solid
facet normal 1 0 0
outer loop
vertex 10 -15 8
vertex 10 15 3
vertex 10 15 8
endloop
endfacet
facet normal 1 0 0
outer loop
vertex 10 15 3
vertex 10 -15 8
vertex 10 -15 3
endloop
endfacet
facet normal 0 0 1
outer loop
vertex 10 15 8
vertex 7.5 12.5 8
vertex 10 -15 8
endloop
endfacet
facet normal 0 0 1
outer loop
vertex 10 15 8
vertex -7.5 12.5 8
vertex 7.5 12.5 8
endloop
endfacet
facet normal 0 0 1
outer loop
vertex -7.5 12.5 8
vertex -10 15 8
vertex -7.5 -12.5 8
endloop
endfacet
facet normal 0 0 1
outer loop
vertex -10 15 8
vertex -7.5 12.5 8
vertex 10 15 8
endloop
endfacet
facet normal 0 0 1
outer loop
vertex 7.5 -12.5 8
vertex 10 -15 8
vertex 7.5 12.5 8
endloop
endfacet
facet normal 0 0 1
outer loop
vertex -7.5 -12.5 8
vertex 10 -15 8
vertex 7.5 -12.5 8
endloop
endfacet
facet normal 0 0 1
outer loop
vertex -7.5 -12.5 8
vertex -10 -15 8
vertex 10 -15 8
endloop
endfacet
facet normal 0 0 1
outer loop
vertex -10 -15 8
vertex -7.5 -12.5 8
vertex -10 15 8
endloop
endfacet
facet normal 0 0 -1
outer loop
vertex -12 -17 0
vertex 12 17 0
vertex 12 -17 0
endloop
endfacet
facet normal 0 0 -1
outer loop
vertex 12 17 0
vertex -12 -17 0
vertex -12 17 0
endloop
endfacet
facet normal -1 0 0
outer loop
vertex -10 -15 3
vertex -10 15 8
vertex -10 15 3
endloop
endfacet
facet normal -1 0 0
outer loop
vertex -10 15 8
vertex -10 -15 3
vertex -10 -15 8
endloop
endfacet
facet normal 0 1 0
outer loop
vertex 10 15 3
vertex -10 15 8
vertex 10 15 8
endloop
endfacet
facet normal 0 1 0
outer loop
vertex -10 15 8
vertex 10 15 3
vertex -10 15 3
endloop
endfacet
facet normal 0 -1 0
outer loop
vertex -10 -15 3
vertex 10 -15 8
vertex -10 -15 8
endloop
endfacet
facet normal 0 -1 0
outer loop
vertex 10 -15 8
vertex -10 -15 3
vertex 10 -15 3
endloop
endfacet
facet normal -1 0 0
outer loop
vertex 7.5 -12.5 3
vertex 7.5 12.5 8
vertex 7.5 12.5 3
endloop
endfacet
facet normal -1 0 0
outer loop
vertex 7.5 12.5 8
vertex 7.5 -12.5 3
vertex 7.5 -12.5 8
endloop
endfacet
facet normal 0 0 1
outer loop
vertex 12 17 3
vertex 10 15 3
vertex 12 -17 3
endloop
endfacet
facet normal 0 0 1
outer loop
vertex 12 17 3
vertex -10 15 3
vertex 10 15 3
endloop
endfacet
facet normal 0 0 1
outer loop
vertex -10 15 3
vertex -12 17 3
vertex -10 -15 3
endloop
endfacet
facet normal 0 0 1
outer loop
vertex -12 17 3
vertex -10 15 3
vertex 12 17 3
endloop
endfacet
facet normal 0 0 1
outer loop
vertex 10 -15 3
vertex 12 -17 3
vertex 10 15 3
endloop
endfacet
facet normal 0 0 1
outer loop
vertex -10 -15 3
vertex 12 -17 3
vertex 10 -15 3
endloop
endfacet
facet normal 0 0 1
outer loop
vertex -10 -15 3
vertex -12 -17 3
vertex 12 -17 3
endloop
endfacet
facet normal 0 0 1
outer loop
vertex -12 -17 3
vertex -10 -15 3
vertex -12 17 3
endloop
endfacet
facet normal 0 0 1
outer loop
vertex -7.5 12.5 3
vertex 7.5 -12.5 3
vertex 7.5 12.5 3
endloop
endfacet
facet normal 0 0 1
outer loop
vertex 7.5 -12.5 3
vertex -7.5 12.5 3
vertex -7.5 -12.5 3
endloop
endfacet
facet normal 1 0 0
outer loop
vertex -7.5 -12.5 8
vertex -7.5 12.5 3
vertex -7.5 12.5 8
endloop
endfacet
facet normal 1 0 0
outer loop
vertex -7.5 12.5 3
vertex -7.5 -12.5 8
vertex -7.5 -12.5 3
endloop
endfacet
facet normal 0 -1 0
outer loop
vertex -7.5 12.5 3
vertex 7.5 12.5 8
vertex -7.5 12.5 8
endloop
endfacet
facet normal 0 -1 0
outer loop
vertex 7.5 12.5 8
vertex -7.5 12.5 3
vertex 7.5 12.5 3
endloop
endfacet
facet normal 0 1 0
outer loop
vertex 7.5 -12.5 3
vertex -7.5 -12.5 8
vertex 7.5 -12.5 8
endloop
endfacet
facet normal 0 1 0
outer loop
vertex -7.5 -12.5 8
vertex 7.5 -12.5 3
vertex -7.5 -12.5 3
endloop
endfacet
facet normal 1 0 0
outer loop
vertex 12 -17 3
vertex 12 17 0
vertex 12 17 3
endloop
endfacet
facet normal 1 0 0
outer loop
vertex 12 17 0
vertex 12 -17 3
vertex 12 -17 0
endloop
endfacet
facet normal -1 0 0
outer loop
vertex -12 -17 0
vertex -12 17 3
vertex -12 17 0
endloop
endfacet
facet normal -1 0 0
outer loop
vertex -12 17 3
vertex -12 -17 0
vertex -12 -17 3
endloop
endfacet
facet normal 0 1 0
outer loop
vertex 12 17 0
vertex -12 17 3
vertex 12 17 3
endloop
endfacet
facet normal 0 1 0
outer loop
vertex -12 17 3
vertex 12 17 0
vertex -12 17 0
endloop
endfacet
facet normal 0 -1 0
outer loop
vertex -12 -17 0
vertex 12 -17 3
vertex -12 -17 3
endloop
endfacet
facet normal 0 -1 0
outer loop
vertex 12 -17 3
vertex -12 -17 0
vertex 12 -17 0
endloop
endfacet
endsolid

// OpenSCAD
// Customizable square device foot
// Created by Kjell Kernen
// Date 14.1.2017

/*[Foot Parameters]*/

// of the foot in mm:
length=20;         // [5:100]

// of the foot in mm:
width=30;          // [5:100]

// of the foot in mm:
total_heigth=8;   // [5:50]

// of the foot in mm:
flange_heigth=3;   // [0:5]

// of the foot in mm:
flange_width=2;    // [0:5]

/*[Hidden]*/
base_heigth=total_heigth-flange_heigth;

difference()
{
    union()
    {
        difference()
        {
            translate([0,0,total_heigth/2])
                cube(size = [length, width, total_heigth], center=true);  
            translate([0,0,(total_heigth+1)/2 + flange_heigth])
                cube(size = [length-5, width-5, total_heigth+1], center=true); 
        }
        translate([0,0,flange_heigth/2])        
            cube(size = [length+flange_width*2, width+flange_width*2, flange_heigth], center=true);
    }       
}
